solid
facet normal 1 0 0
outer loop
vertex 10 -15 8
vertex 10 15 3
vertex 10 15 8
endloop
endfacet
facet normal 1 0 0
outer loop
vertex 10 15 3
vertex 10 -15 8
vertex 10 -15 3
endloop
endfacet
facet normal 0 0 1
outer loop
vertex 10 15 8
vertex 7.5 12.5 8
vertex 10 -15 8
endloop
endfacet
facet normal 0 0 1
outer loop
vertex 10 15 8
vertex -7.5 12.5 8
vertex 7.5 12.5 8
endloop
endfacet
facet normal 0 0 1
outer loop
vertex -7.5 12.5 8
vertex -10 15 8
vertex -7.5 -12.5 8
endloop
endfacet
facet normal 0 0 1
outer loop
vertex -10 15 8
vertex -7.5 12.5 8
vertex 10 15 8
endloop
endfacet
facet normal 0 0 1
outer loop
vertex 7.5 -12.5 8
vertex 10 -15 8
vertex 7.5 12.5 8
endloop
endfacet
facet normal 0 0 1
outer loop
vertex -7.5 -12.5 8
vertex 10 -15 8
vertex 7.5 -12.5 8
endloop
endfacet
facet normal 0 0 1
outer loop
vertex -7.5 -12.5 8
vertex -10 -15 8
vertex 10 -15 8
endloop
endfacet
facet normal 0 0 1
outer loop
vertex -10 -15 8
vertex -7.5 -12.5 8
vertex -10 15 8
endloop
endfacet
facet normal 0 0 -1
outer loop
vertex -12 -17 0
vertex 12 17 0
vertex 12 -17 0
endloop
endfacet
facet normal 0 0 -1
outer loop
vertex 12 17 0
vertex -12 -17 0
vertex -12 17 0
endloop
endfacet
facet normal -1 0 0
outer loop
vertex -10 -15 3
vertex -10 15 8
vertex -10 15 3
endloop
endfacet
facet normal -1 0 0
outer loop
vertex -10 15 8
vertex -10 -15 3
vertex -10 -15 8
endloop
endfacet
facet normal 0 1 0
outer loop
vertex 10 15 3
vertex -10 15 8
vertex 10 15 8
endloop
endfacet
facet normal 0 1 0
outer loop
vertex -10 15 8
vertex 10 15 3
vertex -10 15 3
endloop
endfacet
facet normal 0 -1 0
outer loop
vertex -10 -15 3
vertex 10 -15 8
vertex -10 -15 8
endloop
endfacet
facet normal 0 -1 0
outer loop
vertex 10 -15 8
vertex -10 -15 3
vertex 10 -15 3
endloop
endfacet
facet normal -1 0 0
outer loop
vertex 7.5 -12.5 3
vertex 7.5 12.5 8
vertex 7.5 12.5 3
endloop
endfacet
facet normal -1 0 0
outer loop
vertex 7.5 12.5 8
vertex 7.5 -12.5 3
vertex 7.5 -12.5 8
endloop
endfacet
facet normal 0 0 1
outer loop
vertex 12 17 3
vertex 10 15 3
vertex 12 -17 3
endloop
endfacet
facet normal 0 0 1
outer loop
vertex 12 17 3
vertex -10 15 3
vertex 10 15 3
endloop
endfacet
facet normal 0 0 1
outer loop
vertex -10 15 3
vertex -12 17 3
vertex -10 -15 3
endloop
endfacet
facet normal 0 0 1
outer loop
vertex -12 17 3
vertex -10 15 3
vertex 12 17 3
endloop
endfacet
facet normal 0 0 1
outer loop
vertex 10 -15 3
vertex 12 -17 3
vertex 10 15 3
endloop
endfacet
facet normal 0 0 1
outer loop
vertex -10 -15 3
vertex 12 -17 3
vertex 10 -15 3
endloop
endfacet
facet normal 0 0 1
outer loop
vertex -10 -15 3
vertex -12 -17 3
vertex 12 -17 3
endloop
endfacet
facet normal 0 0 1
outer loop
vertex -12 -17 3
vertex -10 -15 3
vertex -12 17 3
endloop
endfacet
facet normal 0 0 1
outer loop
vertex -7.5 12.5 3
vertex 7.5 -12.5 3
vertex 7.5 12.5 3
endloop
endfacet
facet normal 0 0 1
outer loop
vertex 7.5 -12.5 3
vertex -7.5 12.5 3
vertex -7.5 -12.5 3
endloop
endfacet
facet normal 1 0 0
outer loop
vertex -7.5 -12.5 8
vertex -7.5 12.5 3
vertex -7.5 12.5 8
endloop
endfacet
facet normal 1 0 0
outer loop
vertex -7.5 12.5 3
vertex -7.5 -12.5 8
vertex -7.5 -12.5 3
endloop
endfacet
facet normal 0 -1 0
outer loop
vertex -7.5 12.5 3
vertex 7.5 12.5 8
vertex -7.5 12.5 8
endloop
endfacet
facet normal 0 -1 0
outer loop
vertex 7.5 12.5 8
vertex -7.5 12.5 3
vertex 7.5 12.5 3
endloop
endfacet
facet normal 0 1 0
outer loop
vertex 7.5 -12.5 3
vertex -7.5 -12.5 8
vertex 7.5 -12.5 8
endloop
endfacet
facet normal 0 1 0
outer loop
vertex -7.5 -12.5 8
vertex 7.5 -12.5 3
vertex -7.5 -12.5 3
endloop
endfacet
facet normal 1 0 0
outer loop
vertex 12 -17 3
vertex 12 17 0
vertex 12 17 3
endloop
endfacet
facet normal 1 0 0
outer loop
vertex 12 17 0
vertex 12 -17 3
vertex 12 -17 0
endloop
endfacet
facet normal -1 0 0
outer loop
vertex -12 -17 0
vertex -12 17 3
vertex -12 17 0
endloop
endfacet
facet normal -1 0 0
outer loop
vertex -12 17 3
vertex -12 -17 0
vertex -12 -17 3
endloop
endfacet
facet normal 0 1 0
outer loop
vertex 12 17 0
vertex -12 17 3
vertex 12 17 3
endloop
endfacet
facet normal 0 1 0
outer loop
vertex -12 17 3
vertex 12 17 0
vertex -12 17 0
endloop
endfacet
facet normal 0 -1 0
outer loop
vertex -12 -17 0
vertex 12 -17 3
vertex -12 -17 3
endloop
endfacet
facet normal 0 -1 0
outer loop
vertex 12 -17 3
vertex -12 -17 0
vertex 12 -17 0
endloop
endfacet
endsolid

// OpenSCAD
// Customizable square device foot
// Created by Kjell Kernen
// Date 14.1.2017

/*[Foot Parameters]*/

// of the foot in mm:
length=20;         // [5:100]

// of the foot in mm:
width=30;          // [5:100]

// of the foot in mm:
total_heigth=8;   // [5:50]

// of the foot in mm:
flange_heigth=3;   // [0:5]

// of the foot in mm:
flange_width=2;    // [0:5]

/*[Hidden]*/
base_heigth=total_heigth-flange_heigth;

difference()
{
    union()
    {
        difference()
        {
            translate([0,0,total_heigth/2])
                cube(size = [length, width, total_heigth], center=true);  
            translate([0,0,(total_heigth+1)/2 + flange_heigth])
                cube(size = [length-5, width-5, total_heigth+1], center=true); 
        }
        translate([0,0,flange_heigth/2])        
            cube(size = [length+flange_width*2, width+flange_width*2, flange_heigth], center=true);
    }       
}
